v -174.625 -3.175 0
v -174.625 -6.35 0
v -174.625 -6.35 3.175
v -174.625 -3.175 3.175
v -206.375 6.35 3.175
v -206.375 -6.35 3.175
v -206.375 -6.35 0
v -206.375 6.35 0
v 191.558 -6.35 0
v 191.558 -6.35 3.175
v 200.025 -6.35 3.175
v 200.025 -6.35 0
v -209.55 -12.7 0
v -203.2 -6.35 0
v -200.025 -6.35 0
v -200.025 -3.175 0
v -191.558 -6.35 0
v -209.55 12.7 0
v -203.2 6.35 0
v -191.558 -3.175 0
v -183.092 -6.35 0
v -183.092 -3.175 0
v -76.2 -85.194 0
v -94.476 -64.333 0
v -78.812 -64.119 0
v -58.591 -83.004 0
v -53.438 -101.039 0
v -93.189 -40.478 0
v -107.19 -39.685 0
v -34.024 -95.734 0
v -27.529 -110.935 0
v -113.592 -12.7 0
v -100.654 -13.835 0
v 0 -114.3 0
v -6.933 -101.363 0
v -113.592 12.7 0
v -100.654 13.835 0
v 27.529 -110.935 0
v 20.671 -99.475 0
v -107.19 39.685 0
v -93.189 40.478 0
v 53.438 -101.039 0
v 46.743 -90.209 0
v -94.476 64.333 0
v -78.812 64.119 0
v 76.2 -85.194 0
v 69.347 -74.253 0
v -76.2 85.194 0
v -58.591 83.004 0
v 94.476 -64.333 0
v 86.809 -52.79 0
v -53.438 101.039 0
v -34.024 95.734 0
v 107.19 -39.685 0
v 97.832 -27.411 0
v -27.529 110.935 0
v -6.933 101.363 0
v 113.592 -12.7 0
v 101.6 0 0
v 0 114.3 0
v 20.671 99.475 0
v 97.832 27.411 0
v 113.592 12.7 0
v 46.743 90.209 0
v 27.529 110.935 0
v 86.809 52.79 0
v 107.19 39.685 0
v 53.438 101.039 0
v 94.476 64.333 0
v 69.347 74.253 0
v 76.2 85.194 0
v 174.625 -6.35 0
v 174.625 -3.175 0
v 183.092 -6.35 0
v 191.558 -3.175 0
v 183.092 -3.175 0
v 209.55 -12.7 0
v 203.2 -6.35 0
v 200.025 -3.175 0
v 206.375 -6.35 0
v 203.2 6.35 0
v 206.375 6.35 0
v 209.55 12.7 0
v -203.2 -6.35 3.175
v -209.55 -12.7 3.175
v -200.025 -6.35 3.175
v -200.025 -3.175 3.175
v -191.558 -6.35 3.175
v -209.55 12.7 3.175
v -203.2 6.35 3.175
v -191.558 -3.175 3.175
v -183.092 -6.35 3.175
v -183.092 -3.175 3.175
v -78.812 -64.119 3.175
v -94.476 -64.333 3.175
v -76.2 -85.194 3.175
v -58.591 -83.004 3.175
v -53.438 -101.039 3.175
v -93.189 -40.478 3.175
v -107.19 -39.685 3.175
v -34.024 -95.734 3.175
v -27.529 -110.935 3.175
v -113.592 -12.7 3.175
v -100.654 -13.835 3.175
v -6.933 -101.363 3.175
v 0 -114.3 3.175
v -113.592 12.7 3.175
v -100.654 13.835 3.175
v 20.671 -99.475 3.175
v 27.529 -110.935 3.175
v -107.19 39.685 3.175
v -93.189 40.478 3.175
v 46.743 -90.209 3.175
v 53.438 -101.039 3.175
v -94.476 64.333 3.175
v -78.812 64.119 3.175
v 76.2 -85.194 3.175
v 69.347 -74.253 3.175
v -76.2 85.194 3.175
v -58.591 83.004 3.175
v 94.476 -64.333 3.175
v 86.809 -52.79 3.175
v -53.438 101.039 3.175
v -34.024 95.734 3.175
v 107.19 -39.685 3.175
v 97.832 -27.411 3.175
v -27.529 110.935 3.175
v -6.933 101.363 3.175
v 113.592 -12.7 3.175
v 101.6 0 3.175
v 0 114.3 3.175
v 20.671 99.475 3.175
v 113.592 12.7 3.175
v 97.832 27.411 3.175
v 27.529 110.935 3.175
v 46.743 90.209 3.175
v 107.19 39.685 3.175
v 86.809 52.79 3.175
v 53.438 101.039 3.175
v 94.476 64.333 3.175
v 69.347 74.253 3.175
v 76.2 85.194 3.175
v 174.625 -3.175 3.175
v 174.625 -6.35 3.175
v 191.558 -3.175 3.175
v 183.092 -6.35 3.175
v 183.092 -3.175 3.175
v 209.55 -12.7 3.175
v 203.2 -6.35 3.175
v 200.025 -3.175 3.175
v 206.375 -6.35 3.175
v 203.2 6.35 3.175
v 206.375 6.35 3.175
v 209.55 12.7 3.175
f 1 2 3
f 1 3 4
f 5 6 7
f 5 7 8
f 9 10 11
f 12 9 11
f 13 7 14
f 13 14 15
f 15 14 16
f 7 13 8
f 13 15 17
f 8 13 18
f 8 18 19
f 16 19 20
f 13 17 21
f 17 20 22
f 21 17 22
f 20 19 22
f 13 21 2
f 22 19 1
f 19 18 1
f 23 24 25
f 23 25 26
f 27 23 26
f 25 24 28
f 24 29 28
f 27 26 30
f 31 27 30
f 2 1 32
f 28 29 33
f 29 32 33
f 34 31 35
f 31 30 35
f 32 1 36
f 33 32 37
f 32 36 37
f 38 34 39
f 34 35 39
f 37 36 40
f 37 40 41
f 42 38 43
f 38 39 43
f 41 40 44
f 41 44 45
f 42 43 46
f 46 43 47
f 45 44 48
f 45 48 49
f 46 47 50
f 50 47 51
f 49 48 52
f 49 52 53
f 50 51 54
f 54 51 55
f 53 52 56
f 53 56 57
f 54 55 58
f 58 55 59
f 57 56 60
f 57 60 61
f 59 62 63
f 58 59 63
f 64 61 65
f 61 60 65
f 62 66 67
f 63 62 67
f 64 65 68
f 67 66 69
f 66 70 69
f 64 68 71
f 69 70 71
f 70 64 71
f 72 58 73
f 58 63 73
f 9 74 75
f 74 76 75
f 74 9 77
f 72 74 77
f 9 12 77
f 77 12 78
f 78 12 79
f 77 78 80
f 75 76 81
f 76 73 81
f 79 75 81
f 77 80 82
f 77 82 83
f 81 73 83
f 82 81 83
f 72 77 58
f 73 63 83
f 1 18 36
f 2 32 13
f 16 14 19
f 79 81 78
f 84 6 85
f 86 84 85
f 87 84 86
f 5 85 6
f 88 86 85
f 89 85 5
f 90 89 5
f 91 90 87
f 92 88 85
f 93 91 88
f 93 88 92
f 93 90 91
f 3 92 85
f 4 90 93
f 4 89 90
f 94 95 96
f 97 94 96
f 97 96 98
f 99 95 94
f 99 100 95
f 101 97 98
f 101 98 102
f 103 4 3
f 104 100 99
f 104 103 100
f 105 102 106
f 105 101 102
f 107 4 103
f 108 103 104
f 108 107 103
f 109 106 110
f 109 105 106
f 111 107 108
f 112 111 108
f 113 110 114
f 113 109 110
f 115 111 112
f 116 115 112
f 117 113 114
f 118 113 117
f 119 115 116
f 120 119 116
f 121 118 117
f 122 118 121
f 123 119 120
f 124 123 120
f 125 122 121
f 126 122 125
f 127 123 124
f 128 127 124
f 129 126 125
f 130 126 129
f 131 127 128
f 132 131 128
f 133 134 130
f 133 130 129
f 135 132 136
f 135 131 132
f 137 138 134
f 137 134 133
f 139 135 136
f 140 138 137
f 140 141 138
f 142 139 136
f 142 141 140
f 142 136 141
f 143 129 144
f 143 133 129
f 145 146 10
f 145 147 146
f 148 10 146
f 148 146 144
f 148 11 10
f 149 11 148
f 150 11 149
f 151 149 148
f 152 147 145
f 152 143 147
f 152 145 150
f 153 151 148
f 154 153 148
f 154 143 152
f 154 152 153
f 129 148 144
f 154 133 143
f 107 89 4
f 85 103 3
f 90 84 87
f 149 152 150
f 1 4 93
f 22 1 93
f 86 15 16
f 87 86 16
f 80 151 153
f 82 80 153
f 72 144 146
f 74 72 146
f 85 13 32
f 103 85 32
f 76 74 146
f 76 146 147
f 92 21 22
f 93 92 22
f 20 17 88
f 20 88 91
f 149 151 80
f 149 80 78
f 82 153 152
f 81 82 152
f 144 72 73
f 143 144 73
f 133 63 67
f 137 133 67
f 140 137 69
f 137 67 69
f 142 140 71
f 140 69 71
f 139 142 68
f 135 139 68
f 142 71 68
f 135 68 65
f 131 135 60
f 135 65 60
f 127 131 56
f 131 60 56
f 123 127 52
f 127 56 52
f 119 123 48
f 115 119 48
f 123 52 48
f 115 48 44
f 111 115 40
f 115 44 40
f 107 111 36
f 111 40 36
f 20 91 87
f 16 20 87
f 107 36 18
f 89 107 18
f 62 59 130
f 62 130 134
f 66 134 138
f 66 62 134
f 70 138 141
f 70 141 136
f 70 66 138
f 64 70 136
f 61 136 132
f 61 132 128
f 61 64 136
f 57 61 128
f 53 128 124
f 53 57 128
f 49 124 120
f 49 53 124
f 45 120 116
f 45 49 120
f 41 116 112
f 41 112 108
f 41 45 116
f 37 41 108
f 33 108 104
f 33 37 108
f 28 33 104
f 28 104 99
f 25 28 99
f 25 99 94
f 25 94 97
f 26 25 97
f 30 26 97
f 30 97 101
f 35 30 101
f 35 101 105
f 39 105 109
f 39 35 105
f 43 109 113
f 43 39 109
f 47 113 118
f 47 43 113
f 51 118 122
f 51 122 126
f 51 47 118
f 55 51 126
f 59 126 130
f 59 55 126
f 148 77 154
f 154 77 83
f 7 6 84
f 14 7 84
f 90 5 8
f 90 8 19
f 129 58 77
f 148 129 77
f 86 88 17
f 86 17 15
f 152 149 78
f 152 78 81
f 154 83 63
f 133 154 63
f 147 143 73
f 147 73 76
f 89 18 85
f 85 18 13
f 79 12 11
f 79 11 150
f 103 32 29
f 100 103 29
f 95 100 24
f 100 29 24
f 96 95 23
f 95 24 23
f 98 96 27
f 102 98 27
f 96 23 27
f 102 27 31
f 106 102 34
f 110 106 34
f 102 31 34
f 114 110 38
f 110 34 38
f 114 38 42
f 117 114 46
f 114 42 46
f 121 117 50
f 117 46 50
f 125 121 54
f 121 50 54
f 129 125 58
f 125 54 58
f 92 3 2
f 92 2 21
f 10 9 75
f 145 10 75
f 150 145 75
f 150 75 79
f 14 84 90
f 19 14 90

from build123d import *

# Parameters (mm, degrees)
SKETCH1_R           = 114.3
SKETCH1_R_2         = 101.6
BOSS_EXTRUDE1_DEPTH = 3.175
SKETCH2_W           = 3.175
SKETCH2_H           = 12.7
CUT_EXTRUDE1_DEPTH  = 3.175
SKETCH3_W           = 8.466666667
SKETCH3_H           = 3.175
CUT_EXTRUDE2_DEPTH  = 3.175


with BuildPart() as part:
    # Sketch1 → Boss-Extrude1 (new body)
    # profile 1 of 3: a face of its own
    with BuildSketch(Plane.XY):
        with BuildLine():
            Line((-209.55, -12.7), (-113.592253257, -12.7))
            ThreePointArc((-113.592253257, -12.7), (-114.3, 0), (-113.592253257, 12.7))
            Line((-113.592253257, 12.7), (-209.55, 12.7))
            Line((-209.55, 12.7), (-209.55, -12.7))
        make_face()
    # profile 2 of 3: a face of its own
    with BuildSketch(Plane.XY):
        Circle(SKETCH1_R)
        Circle(SKETCH1_R_2, mode=Mode.SUBTRACT)
    # profile 3 of 3: a face of its own
    with BuildSketch(Plane.XY):
        with BuildLine():
            ThreePointArc((114.3, 0), (114.122926153, -6.3598527), (113.592253257, -12.7))
            Line((113.592253257, -12.7), (209.55, -12.7))
            Line((209.55, -12.7), (209.55, 12.7))
            Line((209.55, 12.7), (113.592253257, 12.7))
            ThreePointArc((113.592253257, 12.7), (114.122926153, 6.3598527), (114.3, 0))
        make_face()
    extrude(amount=BOSS_EXTRUDE1_DEPTH)

    # Sketch2 → Cut-Extrude1 (cut)
    with BuildSketch(Plane.XY.offset(3.175)):
        with Locations((-204.7875, 0)):
            Rectangle(SKETCH2_W, SKETCH2_H)
    cut_extrude1 = extrude(amount=-CUT_EXTRUDE1_DEPTH, mode=Mode.SUBTRACT)

    # Mirror1: Cut-Extrude1 across plane
    add(cut_extrude1.mirror(Plane(origin=(0, 0, 0), x_dir=(0, 0, 1), z_dir=(1, 0, 0))), mode=Mode.SUBTRACT)

    # Sketch3 → Cut-Extrude2 (cut)
    with BuildSketch(Plane.XY.offset(3.175)):
        with Locations((195.791666667, -4.7625)):
            Rectangle(SKETCH3_W, SKETCH3_H)
        with Locations((178.858333334, -4.7625)):
            Rectangle(SKETCH3_W, SKETCH3_H)
    cut_extrude2 = extrude(amount=-CUT_EXTRUDE2_DEPTH, mode=Mode.SUBTRACT)

    # Mirror2: Cut-Extrude2 across plane
    add(cut_extrude2.mirror(Plane(origin=(0, 0, 0), x_dir=(0, 0, 1), z_dir=(1, 0, 0))), mode=Mode.SUBTRACT)


solid = part.part
